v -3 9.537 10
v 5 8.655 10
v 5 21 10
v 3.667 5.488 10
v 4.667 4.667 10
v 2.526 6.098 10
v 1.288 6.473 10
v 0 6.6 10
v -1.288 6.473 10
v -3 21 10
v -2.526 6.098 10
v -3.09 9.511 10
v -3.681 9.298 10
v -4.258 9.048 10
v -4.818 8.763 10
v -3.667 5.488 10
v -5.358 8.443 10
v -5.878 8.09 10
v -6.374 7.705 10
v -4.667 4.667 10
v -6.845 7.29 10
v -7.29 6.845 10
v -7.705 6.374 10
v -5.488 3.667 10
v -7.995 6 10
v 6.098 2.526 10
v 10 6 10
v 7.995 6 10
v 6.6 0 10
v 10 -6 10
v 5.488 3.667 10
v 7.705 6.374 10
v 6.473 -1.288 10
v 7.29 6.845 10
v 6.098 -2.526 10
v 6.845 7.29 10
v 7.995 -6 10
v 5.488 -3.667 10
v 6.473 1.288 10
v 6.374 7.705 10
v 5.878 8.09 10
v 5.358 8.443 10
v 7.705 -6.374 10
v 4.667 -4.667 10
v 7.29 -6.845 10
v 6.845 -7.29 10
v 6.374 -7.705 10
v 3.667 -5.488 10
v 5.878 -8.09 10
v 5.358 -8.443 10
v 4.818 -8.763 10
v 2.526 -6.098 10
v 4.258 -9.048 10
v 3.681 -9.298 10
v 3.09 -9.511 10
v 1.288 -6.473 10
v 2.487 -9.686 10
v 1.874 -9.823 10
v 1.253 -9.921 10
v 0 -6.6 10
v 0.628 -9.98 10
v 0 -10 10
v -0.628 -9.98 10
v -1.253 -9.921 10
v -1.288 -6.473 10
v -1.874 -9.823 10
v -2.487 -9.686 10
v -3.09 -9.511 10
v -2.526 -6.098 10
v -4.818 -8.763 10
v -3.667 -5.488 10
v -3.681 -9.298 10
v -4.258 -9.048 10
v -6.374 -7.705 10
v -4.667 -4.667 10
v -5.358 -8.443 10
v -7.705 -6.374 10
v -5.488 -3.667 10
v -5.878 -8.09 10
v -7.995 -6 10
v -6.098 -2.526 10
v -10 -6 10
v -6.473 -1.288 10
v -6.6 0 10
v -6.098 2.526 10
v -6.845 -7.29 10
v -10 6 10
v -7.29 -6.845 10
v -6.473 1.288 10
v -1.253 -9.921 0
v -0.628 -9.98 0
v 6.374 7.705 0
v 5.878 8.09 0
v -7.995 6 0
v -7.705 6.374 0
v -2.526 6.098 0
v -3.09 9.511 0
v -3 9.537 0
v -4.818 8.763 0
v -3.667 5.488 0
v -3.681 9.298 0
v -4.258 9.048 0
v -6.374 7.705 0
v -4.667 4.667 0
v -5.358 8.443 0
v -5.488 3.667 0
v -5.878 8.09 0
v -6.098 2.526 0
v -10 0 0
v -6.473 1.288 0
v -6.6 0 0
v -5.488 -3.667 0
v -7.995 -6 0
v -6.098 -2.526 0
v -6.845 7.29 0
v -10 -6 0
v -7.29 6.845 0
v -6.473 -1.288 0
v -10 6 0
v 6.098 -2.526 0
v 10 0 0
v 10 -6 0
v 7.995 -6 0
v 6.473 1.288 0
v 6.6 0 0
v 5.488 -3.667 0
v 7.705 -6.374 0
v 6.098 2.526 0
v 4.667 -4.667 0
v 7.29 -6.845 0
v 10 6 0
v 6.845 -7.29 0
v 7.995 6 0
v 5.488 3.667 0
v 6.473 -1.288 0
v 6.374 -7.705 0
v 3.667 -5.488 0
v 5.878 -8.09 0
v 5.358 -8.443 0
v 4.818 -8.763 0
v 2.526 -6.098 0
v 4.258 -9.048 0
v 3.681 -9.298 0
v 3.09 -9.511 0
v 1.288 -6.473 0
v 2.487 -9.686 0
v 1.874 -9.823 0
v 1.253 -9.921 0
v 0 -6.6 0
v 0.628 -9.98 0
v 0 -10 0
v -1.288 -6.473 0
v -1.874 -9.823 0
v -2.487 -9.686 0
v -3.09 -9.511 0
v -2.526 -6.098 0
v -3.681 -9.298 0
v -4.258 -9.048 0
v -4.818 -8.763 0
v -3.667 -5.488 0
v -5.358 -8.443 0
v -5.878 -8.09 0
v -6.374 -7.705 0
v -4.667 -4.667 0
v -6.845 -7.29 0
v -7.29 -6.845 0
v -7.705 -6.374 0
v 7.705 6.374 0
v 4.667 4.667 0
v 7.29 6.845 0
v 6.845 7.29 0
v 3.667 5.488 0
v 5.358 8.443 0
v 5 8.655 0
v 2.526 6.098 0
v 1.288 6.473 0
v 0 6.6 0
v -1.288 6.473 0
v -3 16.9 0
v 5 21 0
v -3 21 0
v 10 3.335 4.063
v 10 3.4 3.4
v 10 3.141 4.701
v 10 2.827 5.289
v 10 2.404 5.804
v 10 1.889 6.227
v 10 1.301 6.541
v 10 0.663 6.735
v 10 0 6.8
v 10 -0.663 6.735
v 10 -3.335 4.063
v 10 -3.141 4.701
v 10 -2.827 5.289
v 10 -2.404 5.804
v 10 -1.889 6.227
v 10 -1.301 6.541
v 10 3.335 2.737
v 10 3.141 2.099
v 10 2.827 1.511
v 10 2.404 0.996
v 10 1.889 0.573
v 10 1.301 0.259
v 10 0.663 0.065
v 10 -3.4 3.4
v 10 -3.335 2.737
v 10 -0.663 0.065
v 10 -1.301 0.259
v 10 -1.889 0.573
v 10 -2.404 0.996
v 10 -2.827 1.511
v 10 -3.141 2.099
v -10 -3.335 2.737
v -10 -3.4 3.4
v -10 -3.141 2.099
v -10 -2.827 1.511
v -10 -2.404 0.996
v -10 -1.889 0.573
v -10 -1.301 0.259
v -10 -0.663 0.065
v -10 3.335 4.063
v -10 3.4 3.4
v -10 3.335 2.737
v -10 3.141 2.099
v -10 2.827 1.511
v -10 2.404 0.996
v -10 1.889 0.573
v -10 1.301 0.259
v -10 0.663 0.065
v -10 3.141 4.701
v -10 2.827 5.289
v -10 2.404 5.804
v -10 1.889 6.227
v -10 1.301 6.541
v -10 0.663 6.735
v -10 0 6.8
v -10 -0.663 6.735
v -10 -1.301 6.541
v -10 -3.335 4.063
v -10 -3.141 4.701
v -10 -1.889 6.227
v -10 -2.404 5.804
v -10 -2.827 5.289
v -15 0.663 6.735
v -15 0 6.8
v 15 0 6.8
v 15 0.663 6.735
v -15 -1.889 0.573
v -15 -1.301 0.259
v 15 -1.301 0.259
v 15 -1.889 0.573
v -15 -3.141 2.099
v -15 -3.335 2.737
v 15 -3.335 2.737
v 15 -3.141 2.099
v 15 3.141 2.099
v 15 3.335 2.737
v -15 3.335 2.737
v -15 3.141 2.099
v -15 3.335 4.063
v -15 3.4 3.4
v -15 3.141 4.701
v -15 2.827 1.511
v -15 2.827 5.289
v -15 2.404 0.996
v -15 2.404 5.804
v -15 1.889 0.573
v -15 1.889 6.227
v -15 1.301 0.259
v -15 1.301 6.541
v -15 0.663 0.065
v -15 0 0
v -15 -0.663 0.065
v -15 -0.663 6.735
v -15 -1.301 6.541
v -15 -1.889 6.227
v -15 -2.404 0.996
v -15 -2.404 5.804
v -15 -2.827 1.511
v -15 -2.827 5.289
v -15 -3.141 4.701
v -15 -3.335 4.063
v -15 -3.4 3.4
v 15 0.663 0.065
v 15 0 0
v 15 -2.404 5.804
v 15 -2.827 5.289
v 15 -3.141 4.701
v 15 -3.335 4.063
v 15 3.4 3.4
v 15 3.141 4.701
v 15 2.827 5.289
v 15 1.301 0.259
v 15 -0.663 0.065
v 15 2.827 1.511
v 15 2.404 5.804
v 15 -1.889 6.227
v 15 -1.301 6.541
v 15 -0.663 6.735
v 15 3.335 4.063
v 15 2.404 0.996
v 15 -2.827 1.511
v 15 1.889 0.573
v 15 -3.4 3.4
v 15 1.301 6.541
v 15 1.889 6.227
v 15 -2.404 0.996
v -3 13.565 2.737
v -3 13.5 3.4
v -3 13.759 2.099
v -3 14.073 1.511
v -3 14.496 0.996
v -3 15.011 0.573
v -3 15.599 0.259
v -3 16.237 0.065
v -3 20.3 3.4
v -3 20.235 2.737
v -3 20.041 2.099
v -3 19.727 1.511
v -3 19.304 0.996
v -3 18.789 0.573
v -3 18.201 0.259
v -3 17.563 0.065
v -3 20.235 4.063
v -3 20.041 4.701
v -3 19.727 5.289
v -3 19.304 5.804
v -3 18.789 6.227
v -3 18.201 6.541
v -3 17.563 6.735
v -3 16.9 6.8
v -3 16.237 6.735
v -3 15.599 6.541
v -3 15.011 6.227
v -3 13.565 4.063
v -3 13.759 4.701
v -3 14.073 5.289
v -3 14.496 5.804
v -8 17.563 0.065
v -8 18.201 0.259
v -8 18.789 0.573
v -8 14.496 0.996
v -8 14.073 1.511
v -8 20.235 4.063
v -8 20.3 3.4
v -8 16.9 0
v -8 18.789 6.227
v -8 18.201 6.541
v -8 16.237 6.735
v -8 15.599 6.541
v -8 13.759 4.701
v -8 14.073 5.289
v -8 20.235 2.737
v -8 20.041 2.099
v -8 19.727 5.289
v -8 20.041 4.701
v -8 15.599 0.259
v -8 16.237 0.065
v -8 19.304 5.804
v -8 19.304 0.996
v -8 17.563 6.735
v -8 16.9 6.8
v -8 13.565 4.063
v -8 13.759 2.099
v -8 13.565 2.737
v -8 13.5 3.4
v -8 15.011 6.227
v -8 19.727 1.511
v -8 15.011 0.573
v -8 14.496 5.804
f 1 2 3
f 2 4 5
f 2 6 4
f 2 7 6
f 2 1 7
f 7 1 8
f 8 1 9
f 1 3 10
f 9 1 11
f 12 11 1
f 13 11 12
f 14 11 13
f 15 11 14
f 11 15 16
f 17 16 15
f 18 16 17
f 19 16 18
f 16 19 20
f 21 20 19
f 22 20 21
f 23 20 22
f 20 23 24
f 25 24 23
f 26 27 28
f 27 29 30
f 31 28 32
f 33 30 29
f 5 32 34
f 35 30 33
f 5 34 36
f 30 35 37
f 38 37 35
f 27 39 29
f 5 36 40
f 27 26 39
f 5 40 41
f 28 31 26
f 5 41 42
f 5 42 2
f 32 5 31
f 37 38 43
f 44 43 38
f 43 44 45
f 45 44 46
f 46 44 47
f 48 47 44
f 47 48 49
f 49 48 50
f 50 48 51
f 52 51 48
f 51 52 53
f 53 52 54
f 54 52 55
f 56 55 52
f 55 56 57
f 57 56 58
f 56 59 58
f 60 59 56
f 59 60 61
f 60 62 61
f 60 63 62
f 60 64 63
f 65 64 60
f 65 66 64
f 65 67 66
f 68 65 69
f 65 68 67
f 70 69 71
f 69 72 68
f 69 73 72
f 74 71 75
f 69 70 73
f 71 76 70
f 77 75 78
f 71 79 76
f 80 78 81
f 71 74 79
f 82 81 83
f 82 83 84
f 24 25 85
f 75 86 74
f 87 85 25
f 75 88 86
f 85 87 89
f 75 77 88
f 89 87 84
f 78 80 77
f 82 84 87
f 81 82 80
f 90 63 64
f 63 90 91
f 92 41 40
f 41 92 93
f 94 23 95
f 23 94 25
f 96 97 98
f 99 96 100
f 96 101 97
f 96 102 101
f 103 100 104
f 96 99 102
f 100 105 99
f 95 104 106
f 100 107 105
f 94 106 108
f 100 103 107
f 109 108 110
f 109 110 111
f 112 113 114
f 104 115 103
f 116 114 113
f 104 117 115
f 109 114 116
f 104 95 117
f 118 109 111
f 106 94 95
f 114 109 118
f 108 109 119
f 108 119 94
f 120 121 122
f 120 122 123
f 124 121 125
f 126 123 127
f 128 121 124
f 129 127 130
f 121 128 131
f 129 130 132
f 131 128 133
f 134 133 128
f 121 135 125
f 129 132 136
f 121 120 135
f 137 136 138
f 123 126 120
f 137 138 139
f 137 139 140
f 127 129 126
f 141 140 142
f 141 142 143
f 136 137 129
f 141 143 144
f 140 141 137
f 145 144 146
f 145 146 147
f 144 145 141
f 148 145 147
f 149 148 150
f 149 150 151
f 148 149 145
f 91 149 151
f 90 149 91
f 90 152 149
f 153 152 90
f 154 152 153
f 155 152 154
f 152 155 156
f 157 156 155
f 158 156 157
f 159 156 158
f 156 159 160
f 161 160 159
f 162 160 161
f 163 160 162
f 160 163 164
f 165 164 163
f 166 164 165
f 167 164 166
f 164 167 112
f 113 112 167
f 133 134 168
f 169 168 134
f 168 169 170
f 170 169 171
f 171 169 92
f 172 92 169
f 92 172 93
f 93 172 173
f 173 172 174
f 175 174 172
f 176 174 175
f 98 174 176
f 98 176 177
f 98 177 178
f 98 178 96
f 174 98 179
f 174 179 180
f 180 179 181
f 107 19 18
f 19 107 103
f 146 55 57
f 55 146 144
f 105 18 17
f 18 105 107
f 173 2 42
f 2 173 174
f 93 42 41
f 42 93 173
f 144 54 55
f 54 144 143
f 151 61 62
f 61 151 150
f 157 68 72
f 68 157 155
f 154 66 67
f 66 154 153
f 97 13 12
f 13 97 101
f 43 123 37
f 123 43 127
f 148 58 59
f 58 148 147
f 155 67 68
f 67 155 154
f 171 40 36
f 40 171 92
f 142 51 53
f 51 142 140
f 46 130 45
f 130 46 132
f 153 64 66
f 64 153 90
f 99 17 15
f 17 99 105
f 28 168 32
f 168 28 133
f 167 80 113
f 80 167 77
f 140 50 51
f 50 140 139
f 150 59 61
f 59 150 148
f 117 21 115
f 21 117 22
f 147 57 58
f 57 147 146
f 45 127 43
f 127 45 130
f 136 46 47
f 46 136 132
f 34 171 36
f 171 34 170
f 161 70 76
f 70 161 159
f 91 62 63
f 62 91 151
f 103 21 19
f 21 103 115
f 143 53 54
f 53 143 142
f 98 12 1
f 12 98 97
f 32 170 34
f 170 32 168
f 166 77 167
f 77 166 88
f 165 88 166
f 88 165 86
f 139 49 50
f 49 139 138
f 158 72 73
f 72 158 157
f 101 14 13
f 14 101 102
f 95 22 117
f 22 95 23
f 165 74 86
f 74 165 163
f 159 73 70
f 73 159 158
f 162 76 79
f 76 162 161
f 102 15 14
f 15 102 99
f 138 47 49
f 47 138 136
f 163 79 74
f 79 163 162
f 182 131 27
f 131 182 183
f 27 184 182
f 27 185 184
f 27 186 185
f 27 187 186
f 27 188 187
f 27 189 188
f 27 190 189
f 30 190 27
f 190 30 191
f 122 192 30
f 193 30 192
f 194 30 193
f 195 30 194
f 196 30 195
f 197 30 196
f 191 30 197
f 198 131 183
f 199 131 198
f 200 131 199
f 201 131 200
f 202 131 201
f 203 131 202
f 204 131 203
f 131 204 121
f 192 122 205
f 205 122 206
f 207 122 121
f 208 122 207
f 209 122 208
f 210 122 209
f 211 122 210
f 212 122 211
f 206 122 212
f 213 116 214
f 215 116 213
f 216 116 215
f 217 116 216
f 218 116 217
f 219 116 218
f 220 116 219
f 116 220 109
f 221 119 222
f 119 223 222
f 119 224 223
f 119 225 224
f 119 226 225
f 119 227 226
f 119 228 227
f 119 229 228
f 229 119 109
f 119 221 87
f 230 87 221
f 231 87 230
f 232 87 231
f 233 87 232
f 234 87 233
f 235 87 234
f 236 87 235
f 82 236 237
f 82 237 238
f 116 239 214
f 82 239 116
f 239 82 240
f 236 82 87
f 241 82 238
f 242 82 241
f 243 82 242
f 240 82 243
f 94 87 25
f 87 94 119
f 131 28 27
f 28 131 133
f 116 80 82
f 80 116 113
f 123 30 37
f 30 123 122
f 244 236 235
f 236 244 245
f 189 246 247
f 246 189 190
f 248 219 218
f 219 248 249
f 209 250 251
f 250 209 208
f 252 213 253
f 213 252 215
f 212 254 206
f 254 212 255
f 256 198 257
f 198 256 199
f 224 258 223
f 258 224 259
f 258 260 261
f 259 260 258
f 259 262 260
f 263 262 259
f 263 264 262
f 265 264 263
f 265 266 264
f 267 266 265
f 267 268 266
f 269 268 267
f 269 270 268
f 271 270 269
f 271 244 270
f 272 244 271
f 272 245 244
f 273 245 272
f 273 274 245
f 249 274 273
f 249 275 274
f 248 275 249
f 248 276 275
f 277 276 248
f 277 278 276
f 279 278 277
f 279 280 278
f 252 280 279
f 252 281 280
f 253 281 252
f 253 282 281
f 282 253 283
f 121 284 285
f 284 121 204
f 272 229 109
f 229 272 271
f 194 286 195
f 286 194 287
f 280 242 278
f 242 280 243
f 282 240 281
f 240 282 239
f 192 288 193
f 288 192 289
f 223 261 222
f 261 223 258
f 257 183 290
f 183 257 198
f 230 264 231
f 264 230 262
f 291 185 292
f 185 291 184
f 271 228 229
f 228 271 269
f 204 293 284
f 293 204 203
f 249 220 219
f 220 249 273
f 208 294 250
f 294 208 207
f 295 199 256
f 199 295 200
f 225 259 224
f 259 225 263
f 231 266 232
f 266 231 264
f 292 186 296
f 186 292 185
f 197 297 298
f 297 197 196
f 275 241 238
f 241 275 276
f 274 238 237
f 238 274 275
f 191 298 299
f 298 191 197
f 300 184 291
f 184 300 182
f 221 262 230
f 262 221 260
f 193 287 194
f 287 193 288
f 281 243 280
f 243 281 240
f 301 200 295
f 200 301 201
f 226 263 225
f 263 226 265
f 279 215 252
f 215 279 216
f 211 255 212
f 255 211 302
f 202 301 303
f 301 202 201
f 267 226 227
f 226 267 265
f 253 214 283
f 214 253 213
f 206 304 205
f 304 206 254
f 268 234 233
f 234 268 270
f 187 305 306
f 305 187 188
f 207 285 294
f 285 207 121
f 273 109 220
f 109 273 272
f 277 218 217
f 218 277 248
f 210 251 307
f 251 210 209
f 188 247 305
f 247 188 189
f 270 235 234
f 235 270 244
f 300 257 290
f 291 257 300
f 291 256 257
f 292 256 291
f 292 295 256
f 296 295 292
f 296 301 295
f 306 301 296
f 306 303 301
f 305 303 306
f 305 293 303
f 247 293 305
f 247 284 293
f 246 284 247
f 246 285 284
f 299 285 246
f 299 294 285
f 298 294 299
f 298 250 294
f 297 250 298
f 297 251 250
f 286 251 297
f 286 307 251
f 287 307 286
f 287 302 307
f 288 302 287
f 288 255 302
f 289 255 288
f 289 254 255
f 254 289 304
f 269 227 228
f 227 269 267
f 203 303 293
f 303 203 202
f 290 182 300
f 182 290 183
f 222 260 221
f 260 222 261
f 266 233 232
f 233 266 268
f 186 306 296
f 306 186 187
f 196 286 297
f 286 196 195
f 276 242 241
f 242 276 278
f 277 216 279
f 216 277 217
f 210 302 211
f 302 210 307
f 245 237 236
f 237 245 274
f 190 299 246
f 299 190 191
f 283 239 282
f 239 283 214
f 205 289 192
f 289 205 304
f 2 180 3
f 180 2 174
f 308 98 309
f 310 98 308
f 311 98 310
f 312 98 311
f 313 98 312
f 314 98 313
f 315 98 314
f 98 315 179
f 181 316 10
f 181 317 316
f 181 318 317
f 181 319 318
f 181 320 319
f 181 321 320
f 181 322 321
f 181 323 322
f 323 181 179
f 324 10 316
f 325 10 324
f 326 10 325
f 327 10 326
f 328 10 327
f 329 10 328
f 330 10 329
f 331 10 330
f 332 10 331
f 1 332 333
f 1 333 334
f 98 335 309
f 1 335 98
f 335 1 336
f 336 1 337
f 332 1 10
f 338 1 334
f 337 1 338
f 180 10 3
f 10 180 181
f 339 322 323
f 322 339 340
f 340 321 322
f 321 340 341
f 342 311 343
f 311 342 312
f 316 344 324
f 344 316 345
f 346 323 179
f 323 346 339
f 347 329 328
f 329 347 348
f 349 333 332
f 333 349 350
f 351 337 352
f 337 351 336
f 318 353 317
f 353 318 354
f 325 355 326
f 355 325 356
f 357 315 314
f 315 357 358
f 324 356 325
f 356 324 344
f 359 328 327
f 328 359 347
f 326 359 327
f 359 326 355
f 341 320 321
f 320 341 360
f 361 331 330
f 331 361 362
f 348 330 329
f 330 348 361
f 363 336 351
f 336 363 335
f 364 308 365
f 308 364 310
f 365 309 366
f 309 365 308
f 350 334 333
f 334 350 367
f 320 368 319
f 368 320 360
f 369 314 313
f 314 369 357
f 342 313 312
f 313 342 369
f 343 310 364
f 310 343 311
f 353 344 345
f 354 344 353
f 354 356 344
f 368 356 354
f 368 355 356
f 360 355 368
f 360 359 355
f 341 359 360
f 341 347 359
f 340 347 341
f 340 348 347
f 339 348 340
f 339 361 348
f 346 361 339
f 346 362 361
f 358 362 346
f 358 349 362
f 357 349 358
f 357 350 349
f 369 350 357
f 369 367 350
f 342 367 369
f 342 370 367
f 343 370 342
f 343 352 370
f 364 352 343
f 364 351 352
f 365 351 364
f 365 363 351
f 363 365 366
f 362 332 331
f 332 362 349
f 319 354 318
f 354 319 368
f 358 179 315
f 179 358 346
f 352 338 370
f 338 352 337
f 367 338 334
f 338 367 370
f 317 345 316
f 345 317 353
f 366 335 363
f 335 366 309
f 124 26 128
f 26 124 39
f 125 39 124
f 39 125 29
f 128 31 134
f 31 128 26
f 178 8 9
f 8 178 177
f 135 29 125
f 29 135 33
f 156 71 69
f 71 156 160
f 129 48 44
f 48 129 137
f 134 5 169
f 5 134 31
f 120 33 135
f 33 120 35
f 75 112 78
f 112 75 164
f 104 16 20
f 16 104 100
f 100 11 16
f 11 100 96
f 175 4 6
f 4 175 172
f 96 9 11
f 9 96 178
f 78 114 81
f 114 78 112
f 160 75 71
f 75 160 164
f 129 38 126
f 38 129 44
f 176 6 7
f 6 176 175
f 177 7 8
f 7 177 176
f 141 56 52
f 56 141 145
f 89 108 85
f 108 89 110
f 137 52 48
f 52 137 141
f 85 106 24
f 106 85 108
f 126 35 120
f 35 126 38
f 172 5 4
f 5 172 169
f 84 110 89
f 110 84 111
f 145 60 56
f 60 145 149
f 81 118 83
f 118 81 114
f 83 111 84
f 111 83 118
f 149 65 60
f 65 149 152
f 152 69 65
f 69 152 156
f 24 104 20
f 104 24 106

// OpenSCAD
w=6.8;
h = 10;

rightPart();

module rightPart() {
    difference() {
        union() {
            os = (14+6);
            //body
            cylinder($fn=100, d=os, h=h);
            translate([-10,-6,0]) cube([20,12,h]);
            
            translate([-os/2-5,0,w/2]) rotate([0,90,0]) cylinder($fn=32, d=w, h=os+2*5);
            
            //arm
            translate([-3,0,0]) cube([8,21,h]);
            translate([-8,13.5+w/2,w/2]) rotate([0,90,0]) cylinder($fn=32, d=w, h=5);
        }
        cylinder($fn=32, d=13.2, h=h);
    }
}

module leftPart() {
    mirror([0,1,0]) rightPart();
}
